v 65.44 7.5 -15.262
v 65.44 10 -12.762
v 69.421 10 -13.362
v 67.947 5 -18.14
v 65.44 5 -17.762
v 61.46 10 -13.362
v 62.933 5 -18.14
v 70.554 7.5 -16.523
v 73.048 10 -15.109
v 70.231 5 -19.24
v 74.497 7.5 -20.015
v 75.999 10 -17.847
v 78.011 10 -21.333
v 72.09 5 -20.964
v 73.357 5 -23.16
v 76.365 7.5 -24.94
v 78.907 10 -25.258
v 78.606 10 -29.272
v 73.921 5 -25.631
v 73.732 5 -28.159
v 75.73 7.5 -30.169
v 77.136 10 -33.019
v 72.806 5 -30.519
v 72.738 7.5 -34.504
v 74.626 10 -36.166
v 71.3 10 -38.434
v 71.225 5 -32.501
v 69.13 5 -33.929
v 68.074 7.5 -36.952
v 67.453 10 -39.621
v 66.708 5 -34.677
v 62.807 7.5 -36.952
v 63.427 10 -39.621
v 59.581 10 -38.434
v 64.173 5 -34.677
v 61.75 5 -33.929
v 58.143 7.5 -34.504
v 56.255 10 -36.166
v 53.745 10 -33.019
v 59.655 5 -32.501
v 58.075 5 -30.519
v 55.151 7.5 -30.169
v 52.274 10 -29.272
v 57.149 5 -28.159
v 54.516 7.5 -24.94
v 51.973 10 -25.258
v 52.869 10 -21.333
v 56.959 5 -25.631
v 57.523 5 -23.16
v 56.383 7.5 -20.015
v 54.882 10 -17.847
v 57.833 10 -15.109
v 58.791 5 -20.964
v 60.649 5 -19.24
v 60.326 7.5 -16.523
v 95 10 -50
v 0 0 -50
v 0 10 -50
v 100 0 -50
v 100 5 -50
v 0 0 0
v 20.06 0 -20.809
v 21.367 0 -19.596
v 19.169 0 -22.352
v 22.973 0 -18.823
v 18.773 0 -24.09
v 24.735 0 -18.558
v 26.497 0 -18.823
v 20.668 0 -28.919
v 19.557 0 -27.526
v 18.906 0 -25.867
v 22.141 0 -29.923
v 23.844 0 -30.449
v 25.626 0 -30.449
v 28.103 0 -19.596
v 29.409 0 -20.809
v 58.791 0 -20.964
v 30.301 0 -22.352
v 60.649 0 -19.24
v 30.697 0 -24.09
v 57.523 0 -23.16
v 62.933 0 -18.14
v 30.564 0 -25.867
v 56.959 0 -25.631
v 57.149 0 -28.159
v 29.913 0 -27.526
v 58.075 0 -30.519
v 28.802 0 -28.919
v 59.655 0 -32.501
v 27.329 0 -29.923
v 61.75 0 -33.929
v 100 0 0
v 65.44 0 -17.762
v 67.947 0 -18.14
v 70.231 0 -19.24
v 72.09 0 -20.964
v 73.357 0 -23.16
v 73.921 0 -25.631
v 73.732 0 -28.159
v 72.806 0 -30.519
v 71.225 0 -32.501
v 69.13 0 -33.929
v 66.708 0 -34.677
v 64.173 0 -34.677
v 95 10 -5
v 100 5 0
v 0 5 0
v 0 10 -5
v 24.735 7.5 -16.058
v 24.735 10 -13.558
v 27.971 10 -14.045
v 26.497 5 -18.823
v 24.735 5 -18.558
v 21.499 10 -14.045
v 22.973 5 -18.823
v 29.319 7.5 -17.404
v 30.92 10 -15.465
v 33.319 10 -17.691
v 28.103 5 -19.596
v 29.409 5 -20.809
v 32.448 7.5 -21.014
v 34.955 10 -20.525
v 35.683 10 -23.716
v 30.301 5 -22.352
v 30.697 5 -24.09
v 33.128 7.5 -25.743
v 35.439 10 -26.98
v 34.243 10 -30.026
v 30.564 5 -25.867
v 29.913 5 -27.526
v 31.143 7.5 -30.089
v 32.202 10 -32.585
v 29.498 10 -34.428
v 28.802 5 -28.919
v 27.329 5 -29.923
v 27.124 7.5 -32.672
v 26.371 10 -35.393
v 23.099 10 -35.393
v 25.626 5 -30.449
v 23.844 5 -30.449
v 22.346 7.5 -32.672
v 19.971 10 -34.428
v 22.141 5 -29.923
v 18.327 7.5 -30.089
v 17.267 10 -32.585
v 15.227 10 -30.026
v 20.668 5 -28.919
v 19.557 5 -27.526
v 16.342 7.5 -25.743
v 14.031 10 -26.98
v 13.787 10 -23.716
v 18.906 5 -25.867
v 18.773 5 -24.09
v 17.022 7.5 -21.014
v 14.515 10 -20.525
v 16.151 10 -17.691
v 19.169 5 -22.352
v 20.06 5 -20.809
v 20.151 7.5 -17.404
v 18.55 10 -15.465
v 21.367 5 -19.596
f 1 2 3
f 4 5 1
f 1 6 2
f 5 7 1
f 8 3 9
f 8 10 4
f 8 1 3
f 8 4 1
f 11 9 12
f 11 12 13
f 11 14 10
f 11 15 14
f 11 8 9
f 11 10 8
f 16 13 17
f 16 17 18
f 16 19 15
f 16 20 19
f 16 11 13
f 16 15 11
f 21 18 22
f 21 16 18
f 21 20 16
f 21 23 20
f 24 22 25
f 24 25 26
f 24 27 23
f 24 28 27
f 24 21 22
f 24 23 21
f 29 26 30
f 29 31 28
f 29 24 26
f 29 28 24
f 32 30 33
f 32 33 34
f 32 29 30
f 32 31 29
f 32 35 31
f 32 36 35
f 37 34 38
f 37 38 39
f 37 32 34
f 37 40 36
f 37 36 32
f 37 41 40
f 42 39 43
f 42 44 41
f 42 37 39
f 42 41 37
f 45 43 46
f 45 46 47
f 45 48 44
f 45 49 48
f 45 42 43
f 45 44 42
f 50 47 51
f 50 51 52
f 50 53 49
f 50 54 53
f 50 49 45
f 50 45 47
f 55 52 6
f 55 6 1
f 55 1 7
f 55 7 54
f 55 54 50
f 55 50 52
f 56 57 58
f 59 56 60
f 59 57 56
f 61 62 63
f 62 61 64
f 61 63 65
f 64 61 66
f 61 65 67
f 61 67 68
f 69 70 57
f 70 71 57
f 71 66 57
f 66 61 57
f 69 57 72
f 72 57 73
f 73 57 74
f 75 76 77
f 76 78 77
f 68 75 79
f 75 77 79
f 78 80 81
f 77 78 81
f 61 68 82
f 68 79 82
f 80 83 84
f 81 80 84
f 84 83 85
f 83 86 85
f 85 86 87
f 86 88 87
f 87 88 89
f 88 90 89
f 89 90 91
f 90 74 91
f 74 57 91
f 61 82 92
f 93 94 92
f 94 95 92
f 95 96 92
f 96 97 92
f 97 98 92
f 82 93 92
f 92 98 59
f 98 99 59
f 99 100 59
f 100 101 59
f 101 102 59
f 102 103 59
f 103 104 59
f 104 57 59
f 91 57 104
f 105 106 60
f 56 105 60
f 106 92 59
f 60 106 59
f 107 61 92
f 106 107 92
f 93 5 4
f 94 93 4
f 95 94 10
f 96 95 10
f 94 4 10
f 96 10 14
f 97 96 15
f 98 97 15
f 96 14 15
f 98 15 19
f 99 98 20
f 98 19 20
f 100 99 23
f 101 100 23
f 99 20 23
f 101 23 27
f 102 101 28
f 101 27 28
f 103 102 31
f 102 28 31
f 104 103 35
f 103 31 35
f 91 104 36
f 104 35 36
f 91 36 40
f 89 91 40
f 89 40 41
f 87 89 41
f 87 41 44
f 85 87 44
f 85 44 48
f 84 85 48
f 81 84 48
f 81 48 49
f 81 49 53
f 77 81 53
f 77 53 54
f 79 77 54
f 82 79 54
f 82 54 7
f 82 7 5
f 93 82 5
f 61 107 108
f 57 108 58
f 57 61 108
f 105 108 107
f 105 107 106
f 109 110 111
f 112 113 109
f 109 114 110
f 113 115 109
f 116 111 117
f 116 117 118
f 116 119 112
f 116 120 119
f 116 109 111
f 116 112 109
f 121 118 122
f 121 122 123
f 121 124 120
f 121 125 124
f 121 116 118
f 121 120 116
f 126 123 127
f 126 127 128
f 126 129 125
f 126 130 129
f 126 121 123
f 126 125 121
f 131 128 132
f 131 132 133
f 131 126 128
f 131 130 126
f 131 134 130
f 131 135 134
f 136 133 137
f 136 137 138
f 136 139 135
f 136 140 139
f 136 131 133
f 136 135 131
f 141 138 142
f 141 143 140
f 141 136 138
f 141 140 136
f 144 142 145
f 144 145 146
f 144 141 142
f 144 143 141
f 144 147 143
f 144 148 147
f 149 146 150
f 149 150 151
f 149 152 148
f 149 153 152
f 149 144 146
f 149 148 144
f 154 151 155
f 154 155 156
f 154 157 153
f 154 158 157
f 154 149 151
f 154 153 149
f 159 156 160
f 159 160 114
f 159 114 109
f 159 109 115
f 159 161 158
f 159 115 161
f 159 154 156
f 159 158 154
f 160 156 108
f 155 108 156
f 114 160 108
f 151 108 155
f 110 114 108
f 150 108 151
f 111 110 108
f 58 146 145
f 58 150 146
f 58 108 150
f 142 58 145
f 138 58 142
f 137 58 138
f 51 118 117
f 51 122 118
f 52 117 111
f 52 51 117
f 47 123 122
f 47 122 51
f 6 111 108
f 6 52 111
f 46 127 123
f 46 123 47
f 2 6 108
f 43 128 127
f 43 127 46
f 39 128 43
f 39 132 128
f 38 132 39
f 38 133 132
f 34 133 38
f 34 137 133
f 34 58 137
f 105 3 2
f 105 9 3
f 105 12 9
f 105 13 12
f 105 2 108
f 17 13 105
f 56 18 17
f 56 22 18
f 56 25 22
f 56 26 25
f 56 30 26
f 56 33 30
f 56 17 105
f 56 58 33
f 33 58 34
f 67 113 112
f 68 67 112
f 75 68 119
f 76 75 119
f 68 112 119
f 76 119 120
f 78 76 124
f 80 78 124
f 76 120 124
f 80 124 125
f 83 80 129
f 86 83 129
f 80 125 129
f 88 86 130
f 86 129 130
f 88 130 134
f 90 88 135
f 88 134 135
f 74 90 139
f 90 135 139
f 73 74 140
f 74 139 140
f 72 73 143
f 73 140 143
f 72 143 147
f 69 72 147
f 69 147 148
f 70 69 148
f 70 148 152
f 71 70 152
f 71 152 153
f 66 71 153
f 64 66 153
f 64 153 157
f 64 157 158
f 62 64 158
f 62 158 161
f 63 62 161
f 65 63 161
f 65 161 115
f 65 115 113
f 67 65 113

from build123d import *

# Parameters (mm, degrees)
SKIZZE1_W                       = 100
SKIZZE1_H                       = 50
AUFSATZ_LINEAR_AUSTRAGEN1_DEPTH = 10
SKIZZE2_R                       = 5.979005814
SCHNITT_LINEAR_AUSTRAGEN1_DEPTH = 11
FASE1_SIZE                      = 5
SKIZZE3_R                       = 8.504790413
SCHNITT_MIT_EXTRA_FASE_DEPTH    = 11
FASE2_SIZE                      = 5


with BuildPart() as part:
    # Skizze1 → Aufsatz-Linear austragen1 (new body)
    with BuildSketch(Plane(origin=(0, 0, 0), x_dir=(1, 0, 0), z_dir=(0, 1, 0))):
        with Locations((50, 25)):
            Rectangle(SKIZZE1_W, SKIZZE1_H)
    extrude(amount=AUFSATZ_LINEAR_AUSTRAGEN1_DEPTH)

    # Skizze2 → Schnitt-Linear austragen1 (cut, through all)
    with BuildSketch(Plane(origin=(0, 10, 0), x_dir=(1, 0, 0), z_dir=(0, 1, 0))):
        with Locations(Location((24.734846156, 24.536515152, 0), (0, 0, 270))):  # turned: the seam where the file's is
            Circle(SKIZZE2_R)
    extrude(amount=-SCHNITT_LINEAR_AUSTRAGEN1_DEPTH, mode=Mode.SUBTRACT)

    # Fase1
    fase1_edges = [part.edges().sort_by_distance(p)[0] for p in [
        (100, 10, -25),
        (24.734846156, 10, -30.515520966),
        (50, 10, 0),
    ]]
    chamfer(fase1_edges, length=FASE1_SIZE)

    # Skizze3 → Schnitt mit extra Fase (cut, through all)
    with BuildSketch(Plane(origin=(0, 10, 0), x_dir=(1, 0, 0), z_dir=(0, 1, 0))):
        with Locations(Location((65.440217499, 26.266772753, 0), (0, 0, 270))):  # turned: the seam where the file's is
            Circle(SKIZZE3_R)
    extrude(amount=-SCHNITT_MIT_EXTRA_FASE_DEPTH, mode=Mode.SUBTRACT)

    # Fase2
    fase2_edges = [part.edges().sort_by_distance(p)[0] for p in [
        (65.440217499, 10, -34.771563166),
    ]]
    chamfer(fase2_edges, length=FASE2_SIZE)


solid = part.part
